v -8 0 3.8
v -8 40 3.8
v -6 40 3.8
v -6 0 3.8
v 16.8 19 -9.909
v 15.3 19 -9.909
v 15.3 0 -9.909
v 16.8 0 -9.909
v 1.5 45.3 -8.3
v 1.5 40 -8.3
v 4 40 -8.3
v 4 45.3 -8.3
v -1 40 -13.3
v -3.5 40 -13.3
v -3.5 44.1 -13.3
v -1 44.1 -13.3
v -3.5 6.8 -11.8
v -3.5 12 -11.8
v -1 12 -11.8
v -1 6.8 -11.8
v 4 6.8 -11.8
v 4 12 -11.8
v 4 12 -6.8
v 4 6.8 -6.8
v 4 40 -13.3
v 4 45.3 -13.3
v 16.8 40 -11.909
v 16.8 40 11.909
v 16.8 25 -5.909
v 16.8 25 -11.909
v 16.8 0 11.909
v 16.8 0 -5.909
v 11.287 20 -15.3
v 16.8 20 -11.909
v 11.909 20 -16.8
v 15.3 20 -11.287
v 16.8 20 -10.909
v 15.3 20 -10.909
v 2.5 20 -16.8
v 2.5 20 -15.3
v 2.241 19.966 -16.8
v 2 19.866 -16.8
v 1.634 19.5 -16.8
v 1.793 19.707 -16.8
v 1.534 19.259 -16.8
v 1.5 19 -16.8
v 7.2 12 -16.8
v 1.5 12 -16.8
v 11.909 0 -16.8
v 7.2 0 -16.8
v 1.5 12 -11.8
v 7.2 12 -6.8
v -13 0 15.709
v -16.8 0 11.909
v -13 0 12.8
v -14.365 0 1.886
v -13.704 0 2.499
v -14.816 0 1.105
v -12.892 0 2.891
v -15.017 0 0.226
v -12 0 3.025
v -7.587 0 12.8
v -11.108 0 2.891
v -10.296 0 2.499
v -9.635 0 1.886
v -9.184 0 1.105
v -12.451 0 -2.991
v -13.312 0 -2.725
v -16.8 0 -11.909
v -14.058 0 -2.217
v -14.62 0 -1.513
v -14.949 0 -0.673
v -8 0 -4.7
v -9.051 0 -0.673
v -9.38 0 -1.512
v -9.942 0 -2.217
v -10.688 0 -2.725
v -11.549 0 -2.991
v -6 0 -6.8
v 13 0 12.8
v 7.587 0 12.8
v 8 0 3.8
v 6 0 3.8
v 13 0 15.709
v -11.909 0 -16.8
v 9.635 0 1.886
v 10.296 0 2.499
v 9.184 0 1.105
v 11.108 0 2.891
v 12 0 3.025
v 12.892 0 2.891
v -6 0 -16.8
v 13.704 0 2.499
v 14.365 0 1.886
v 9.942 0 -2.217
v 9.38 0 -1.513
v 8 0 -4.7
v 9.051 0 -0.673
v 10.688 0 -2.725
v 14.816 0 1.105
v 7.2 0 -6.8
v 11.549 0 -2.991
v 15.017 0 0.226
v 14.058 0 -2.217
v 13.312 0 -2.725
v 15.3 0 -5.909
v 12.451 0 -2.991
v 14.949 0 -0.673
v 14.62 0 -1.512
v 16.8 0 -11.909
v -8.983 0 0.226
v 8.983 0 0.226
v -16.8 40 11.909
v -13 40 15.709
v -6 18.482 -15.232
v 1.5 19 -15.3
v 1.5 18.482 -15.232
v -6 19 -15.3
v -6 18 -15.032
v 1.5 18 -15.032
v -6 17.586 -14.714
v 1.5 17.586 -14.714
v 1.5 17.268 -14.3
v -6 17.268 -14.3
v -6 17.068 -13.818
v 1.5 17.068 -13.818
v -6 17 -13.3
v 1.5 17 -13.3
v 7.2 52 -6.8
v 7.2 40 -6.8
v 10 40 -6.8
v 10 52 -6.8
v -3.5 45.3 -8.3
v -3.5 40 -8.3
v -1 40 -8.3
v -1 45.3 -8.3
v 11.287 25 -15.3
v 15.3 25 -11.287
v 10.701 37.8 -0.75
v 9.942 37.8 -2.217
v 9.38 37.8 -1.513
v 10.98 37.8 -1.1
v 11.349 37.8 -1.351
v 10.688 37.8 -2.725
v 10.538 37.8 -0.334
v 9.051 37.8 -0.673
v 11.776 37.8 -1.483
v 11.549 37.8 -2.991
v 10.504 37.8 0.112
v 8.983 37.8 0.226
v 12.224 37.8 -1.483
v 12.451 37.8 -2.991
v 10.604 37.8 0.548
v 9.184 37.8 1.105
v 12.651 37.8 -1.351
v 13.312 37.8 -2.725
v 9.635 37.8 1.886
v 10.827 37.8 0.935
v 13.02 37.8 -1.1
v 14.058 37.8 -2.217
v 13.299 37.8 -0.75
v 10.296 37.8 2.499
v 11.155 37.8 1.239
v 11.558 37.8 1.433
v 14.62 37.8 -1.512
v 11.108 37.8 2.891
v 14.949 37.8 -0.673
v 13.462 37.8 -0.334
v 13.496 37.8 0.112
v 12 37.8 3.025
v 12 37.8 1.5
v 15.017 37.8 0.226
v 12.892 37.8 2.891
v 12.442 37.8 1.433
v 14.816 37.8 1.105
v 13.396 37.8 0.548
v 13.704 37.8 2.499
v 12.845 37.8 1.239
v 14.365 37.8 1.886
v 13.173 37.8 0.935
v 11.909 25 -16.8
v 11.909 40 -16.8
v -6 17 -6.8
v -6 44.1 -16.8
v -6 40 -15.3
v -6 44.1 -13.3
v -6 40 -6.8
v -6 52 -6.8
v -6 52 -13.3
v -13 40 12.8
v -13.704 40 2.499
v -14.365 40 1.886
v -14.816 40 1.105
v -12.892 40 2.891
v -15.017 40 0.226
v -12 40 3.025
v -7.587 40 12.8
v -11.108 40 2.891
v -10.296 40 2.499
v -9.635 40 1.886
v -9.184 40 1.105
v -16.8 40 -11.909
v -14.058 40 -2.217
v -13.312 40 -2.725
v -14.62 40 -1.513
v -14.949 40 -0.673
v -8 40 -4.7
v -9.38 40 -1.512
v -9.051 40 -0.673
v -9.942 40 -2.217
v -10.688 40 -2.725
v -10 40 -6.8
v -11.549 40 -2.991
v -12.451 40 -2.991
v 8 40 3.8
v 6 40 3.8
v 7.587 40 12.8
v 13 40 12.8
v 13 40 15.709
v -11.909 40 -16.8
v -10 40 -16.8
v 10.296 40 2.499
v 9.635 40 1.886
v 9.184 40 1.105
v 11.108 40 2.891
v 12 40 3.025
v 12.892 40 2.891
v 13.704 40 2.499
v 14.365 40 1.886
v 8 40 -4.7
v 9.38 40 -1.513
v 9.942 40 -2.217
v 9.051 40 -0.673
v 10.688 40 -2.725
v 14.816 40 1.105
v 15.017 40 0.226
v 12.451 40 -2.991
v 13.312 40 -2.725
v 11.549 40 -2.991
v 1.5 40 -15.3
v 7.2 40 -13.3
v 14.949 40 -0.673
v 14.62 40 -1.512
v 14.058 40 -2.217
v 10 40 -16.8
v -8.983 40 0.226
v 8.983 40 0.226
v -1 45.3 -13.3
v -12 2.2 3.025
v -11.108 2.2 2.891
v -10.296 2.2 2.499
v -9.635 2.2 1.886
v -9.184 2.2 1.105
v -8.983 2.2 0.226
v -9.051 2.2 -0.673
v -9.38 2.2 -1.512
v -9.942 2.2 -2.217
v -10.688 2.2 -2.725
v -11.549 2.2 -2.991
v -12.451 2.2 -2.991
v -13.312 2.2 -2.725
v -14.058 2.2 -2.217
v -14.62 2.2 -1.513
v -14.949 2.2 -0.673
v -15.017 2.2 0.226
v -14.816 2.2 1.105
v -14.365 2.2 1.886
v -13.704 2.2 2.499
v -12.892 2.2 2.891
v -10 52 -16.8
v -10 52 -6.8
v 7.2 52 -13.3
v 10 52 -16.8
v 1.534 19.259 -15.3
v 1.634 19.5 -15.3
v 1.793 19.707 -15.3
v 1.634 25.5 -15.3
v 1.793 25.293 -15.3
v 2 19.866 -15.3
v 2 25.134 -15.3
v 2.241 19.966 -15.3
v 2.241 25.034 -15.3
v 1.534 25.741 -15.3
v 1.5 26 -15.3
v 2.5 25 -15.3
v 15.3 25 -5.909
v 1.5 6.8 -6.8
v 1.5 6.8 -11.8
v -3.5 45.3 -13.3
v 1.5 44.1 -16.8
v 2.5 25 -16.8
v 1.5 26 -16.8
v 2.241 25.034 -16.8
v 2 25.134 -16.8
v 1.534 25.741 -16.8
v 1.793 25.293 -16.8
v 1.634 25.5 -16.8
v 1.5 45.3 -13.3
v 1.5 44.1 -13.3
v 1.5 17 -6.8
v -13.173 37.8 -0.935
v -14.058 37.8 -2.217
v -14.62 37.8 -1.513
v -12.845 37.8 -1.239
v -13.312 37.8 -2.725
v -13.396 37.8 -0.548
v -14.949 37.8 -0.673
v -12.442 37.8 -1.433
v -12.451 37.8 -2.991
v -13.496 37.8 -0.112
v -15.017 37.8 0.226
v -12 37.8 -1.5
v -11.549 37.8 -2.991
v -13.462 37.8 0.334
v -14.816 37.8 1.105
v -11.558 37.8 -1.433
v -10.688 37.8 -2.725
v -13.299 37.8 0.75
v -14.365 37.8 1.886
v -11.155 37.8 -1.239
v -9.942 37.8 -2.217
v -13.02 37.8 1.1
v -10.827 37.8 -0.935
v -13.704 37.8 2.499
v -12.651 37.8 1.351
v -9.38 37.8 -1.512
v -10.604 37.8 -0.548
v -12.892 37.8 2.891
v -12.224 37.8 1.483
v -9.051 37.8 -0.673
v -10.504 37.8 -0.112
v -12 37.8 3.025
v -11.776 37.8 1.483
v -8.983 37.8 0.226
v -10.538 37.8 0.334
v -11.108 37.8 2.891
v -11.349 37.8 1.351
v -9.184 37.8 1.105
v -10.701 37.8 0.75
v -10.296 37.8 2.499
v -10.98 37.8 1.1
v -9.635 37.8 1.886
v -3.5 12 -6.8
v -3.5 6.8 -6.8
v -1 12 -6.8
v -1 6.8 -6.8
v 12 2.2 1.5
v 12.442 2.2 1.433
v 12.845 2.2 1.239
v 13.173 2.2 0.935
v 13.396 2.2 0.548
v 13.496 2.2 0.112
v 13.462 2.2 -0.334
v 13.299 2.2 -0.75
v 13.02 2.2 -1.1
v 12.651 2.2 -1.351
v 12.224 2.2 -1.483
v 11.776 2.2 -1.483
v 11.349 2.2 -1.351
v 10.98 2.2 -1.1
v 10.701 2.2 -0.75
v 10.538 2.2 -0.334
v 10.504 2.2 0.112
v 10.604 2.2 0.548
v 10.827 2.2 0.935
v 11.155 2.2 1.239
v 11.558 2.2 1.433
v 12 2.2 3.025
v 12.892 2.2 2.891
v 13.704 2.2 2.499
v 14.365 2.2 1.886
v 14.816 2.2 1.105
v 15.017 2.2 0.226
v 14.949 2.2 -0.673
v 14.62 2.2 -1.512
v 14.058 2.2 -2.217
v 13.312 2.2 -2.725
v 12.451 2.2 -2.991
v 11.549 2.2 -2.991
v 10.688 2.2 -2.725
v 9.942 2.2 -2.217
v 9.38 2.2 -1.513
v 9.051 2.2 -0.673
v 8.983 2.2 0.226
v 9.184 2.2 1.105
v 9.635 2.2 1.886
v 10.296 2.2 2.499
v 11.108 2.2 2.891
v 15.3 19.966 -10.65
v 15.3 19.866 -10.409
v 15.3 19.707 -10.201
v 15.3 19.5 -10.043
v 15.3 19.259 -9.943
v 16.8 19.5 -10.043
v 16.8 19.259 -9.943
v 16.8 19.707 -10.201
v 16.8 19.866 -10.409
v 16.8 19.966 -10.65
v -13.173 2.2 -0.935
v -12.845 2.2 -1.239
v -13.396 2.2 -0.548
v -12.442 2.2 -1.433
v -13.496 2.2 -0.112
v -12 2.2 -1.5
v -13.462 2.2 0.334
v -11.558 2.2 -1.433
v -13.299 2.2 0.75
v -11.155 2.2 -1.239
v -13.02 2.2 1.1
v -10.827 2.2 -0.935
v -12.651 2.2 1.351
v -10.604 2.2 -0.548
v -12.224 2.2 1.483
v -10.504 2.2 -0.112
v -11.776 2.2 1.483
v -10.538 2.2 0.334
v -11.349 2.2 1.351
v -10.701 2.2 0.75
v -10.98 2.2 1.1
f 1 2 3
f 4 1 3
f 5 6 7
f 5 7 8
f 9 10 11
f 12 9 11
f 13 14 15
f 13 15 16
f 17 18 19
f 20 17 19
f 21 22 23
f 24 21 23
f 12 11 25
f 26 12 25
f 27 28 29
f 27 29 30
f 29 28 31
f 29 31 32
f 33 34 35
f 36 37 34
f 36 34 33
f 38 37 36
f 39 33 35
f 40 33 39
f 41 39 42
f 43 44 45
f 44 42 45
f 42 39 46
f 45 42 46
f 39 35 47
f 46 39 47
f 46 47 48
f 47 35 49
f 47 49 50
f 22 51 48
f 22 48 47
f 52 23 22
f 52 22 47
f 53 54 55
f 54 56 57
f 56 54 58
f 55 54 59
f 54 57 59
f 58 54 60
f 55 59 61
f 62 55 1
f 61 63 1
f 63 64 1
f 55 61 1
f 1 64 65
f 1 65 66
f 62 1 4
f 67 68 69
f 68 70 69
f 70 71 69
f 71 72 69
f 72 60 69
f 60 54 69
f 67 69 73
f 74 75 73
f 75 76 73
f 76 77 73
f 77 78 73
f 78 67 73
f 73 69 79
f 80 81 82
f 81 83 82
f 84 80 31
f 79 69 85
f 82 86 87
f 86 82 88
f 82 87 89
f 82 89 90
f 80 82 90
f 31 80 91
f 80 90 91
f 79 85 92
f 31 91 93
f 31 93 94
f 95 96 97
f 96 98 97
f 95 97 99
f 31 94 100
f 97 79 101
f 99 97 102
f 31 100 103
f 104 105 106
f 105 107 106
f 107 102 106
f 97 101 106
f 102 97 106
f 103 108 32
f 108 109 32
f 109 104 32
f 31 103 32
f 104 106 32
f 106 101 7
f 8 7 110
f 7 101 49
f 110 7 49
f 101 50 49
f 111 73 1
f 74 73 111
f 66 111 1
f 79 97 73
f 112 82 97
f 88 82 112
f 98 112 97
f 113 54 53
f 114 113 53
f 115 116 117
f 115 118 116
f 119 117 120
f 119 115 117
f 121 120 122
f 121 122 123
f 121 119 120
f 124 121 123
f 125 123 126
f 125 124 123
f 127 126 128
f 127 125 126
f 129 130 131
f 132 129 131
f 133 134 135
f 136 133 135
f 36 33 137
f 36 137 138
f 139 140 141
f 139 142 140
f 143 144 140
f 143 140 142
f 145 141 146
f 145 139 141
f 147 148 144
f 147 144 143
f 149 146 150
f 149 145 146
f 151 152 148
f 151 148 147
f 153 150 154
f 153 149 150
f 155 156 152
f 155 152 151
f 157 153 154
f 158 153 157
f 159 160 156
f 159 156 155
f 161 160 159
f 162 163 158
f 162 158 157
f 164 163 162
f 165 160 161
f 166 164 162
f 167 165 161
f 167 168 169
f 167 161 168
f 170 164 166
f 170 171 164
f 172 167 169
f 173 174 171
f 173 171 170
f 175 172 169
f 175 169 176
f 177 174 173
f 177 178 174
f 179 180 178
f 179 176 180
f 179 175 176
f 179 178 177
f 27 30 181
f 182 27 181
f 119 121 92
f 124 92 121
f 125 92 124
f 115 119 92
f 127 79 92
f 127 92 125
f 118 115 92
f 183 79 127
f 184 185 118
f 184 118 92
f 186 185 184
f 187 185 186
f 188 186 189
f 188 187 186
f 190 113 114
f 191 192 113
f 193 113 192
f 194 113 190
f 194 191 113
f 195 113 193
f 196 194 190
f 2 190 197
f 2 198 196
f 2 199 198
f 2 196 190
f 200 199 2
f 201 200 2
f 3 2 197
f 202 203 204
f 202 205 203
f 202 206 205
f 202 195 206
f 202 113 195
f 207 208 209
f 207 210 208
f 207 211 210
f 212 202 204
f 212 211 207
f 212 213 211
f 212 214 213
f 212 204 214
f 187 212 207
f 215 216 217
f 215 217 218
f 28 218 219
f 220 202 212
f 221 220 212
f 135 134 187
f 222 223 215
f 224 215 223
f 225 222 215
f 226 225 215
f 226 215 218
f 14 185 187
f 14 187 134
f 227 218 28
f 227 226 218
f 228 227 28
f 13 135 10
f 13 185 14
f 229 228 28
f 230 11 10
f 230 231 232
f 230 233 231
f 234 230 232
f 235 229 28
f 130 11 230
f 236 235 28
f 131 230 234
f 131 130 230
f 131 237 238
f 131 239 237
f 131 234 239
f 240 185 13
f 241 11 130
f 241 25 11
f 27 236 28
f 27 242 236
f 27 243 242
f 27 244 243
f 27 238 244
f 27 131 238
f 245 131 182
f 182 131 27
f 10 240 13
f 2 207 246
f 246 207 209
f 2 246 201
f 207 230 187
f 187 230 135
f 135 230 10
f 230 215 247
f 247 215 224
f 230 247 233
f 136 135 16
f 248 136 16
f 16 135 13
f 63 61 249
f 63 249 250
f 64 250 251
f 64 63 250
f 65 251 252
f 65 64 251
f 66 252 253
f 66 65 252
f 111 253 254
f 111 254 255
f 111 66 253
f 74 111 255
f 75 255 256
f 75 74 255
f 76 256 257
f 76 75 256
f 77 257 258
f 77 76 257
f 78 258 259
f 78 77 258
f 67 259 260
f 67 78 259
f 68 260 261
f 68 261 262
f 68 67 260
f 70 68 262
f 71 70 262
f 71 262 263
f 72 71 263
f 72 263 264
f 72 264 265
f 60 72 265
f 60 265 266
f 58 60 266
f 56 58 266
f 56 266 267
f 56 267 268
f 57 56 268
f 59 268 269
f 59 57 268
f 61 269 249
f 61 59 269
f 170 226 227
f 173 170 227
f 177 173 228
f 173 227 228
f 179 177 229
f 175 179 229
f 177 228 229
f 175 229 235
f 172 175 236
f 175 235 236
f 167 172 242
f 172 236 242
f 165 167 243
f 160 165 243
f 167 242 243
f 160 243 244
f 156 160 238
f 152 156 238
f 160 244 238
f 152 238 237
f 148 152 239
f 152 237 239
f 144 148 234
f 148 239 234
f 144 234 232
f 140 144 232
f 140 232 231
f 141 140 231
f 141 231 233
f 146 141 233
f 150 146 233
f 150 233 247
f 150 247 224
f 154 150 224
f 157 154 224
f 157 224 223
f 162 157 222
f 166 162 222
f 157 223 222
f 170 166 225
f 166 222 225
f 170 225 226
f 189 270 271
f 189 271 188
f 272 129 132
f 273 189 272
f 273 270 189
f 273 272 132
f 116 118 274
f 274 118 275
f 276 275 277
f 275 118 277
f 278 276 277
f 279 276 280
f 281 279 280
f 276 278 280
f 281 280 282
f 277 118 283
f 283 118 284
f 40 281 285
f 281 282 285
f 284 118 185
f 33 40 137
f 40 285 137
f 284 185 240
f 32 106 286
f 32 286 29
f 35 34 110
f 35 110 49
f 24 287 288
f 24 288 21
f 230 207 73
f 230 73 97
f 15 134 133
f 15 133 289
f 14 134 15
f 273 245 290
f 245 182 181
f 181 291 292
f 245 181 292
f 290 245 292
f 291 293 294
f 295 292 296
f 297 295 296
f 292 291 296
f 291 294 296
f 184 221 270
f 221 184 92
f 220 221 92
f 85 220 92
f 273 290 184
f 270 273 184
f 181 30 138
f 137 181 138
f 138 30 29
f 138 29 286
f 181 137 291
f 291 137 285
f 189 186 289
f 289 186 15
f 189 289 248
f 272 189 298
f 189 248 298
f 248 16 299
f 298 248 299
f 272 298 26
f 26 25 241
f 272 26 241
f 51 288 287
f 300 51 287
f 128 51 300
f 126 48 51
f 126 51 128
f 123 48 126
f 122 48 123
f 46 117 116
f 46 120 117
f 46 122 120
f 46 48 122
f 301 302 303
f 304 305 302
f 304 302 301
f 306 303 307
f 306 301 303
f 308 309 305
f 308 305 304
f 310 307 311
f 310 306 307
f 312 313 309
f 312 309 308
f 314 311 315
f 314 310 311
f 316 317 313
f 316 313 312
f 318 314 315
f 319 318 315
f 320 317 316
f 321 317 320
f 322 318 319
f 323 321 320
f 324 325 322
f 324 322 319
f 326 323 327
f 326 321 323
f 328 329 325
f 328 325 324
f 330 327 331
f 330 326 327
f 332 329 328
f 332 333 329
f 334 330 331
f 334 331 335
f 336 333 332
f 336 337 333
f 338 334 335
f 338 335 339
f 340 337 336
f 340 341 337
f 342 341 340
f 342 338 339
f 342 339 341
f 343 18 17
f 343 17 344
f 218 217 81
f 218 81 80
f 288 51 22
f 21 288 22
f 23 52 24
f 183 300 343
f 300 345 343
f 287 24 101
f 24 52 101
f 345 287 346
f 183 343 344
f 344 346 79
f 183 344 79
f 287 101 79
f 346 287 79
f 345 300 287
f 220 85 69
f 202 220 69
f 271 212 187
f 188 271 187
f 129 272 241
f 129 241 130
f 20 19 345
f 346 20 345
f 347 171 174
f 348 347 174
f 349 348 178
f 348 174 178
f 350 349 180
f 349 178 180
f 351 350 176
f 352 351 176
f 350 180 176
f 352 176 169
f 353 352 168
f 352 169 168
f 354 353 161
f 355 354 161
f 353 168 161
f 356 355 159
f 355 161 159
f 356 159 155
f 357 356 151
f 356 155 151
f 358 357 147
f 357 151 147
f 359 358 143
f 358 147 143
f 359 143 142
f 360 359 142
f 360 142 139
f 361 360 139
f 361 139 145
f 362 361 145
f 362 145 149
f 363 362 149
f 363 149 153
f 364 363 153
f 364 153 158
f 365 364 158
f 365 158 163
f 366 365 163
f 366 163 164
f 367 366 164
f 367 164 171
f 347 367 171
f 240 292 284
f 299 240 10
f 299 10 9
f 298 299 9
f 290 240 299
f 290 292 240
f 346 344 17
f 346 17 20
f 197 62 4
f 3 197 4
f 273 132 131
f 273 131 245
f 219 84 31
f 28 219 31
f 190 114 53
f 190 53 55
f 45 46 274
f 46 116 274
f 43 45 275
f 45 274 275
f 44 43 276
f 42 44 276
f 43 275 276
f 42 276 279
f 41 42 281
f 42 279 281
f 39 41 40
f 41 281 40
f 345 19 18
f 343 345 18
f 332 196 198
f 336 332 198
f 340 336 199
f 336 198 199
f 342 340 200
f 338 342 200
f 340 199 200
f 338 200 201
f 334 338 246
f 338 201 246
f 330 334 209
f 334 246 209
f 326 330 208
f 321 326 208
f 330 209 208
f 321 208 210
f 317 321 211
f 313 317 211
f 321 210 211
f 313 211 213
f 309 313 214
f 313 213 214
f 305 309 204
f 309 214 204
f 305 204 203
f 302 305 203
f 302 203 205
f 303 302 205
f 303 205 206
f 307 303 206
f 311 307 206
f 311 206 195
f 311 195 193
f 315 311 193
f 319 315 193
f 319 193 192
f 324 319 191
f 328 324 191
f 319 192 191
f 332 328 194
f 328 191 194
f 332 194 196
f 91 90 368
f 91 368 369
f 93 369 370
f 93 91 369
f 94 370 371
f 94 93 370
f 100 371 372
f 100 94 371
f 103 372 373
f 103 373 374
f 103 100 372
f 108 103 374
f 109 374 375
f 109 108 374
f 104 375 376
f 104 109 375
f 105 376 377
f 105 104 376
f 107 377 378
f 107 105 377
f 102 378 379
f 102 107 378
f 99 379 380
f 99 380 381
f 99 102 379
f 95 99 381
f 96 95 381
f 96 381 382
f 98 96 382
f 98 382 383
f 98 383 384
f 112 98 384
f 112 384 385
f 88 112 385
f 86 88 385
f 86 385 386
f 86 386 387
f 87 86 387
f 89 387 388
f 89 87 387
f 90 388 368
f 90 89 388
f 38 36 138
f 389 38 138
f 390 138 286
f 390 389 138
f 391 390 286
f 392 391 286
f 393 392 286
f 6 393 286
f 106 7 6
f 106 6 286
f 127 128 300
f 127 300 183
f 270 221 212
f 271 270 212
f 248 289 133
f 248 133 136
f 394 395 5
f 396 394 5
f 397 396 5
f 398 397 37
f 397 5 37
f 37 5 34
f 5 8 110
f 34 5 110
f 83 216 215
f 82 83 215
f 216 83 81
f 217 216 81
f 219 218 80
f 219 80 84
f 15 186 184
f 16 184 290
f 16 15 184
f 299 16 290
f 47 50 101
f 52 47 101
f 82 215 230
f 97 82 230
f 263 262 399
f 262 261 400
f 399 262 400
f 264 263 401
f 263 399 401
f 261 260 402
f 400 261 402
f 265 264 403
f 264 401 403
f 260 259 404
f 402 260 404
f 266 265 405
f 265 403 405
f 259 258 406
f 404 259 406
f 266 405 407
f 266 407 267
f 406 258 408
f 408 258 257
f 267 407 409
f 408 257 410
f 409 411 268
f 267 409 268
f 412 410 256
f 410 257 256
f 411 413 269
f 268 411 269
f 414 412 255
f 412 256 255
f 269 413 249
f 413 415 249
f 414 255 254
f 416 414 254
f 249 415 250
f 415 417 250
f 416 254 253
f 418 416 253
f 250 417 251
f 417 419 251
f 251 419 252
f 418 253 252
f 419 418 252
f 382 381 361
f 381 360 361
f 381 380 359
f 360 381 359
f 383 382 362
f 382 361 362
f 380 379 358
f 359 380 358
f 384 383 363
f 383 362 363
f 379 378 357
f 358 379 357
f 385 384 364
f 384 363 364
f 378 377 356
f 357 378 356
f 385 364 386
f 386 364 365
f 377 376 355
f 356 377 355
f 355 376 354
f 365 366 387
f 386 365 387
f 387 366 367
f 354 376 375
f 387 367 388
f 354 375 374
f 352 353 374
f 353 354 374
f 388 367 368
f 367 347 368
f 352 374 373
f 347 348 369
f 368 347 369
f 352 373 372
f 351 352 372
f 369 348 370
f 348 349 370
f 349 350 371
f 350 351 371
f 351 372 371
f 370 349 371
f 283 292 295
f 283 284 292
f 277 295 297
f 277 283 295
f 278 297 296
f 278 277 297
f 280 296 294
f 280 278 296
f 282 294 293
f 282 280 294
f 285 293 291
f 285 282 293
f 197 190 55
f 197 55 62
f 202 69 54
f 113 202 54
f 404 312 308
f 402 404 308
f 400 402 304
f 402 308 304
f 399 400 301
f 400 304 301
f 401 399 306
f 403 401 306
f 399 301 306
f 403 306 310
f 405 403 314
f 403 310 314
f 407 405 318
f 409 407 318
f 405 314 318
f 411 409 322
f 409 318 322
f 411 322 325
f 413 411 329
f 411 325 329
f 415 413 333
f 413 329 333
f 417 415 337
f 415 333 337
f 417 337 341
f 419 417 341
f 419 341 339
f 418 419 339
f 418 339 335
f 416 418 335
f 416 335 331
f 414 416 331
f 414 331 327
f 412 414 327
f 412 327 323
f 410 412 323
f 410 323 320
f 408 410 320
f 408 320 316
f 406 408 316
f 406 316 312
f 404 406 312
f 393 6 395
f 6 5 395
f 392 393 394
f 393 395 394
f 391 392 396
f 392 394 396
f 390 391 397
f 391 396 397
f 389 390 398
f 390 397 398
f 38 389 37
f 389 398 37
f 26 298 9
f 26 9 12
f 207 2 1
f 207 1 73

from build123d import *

# Parameters (mm, degrees)
EXTRUDE_1_DEPTH      = 40
SKETCH_2_R           = 1.5
CUT_EXTRUDE_1_DEPTH  = 47.523972315
CUT_EXTRUDE_2_DEPTH  = 47.523972315
EXTRUDE_2_DEPTH      = 12
SKETCH_5_W           = 12
SKETCH_5_H           = 8.5
CUT_EXTRUDE_3_DEPTH  = 47.523972315
CUT_EXTRUDE_4_DEPTH  = 12
SKETCH_7_W           = 2.5
SKETCH_7_H           = 5
EXTRUDE_3_DEPTH      = 5.3
SKETCH_8_W           = 2.5
SKETCH_8_H           = 5
EXTRUDE_4_DEPTH      = 5.2
SKETCH_10_W          = 16
SKETCH_10_H          = 8.5
CUT_EXTRUDE_5_DEPTH  = 47.523972315
SKETCH_11_W          = 7.5
SKETCH_11_H          = 4.1
CUT_EXTRUDE_6_DEPTH  = 11
SKETCH_15_W          = 7.5
SKETCH_15_H          = 5
CUT_EXTRUDE_10_DEPTH = 10
SKETCH_12_W          = 7.5
SKETCH_12_H          = 1.5
CUT_EXTRUDE_7_DEPTH  = 28
CUT_EXTRUDE_START    = -20
CUT_EXTRUDE_8_DEPTH  = 5
FILLET_2_R           = 2
SKETCH_16_R          = 3.025
CUT_EXTRUDE_11_DEPTH = 2.2
SKETCH_17_W          = 1.5
SKETCH_17_H          = 4
CUT_EXTRUDE_12_DEPTH = 40.855739863
FILLET_3_R           = 1


with BuildPart() as part:
    # 草图1 → 凸台-拉伸1 (new body)
    with BuildSketch(Plane(origin=(0, 0, 0), x_dir=(1, 0, 0), z_dir=(0, 1, 0))):
        Polygon((11.908535316, 16.8), (-11.908535316, 16.8), (-16.8, 11.908535316), (-16.8, -11.908535316), (-11.908535316, -16.8), (11.908535316, -16.8), (16.8, -11.908535316), (16.8, 11.908535316), align=None)
    extrude(amount=EXTRUDE_1_DEPTH)

    # 草图2 → 切除-拉伸1 (cut, through all)
    with BuildSketch(Plane(origin=(0, 40, 0), x_dir=(1, 0, 0), z_dir=(0, 1, 0))):
        with Locations(Location((12, 0, 0), (0, 0, 270))):
            Circle(SKETCH_2_R)
        with Locations(Location((-12, 0, 0), (0, 0, 90))):
            Circle(SKETCH_2_R)
    extrude(amount=-CUT_EXTRUDE_1_DEPTH, mode=Mode.SUBTRACT)

    # 草图3 → 切除-拉伸2 (cut, through all)
    with BuildSketch(Plane(origin=(0, 40, 0), x_dir=(1, 0, 0), z_dir=(0, 1, 0))):
        Polygon((-6, -3.8), (6, -3.8), (7.586942826, -12.8), (13, -12.8), (13, -16.8), (-13, -16.8), (-13, -12.8), (-7.586942826, -12.8), align=None)
    extrude(amount=-CUT_EXTRUDE_2_DEPTH, mode=Mode.SUBTRACT)

    # 草图4 → 凸台-拉伸2 (add)
    with BuildSketch(Plane(origin=(0, 40, 0), x_dir=(1, 0, 0), z_dir=(0, 1, 0))):
        Polygon((-10, 16.8), (-10, 6.8), (-6, 6.8), (-6, 13.3), (7.2, 13.3), (7.2, 6.8), (10, 6.8), (10, 16.8), align=None)
    extrude(amount=EXTRUDE_2_DEPTH)

    # 草图5 → 切除-拉伸3 (cut, through all)
    with BuildSketch(Plane(origin=(0, 40, 0), x_dir=(1, 0, 0), z_dir=(0, 1, 0))):
        with Locations((0, 0.45)):
            Rectangle(SKETCH_5_W, SKETCH_5_H)
    extrude(amount=-CUT_EXTRUDE_3_DEPTH, mode=Mode.SUBTRACT)

    # 草图6 → 切除-拉伸4 (cut)
    with BuildSketch(Plane.XZ):
        Polygon((-6, -6.8), (-6, -13.3), (-6, -16.8), (7.2, -16.8), (7.2, -13.3), (7.2, -6.8), align=None)
    extrude(amount=-CUT_EXTRUDE_4_DEPTH, mode=Mode.SUBTRACT)

    # 草图7 → 凸台-拉伸3 (add)
    with BuildSketch(Plane(origin=(0, 40, 0), x_dir=(1, 0, 0), z_dir=(0, 1, 0))):
        with Locations((2.75, 10.8)):
            Rectangle(SKETCH_7_W, SKETCH_7_H)
        with Locations((-2.25, 10.8)):
            Rectangle(SKETCH_7_W, SKETCH_7_H)
    extrude(amount=EXTRUDE_3_DEPTH)

    # 草图8 → 凸台-拉伸4 (add)
    with BuildSketch(Plane.XZ.offset(-12)):
        with Locations((-2.25, -9.3)):
            Rectangle(SKETCH_8_W, SKETCH_8_H)
        with Locations((2.75, -9.3)):
            Rectangle(SKETCH_8_W, SKETCH_8_H)
    extrude(amount=EXTRUDE_4_DEPTH)

    # 草图10 → 切除-拉伸5 (cut, through all)
    with BuildSketch(Plane(origin=(0, 40, 0), x_dir=(1, 0, 0), z_dir=(0, 1, 0))):
        with Locations((0, 0.45)):
            Rectangle(SKETCH_10_W, SKETCH_10_H)
    extrude(amount=-CUT_EXTRUDE_5_DEPTH, mode=Mode.SUBTRACT)

    # 草图11 → 切除-拉伸6 (cut)
    with BuildSketch(Plane.XY.offset(-13.3)):
        with Locations((-2.25, 42.05)):
            Rectangle(SKETCH_11_W, SKETCH_11_H)
    extrude(amount=-CUT_EXTRUDE_6_DEPTH, mode=Mode.SUBTRACT)

    # 草图15 → 切除-拉伸10 (cut)
    with BuildSketch(Plane(origin=(0, 0, -16.8), x_dir=(-1, 0, 0), z_dir=(0, 0, -1))):
        with Locations((2.25, 14.5)):
            Rectangle(SKETCH_15_W, SKETCH_15_H)
    extrude(amount=-CUT_EXTRUDE_10_DEPTH, mode=Mode.SUBTRACT)

    # 草图12 → 切除-拉伸7 (cut)
    with BuildSketch(Plane(origin=(0, 40, 0), x_dir=(1, 0, 0), z_dir=(0, 1, 0))):
        with Locations((-2.25, 16.05)):
            Rectangle(SKETCH_12_W, SKETCH_12_H)
    extrude(amount=-CUT_EXTRUDE_7_DEPTH, mode=Mode.SUBTRACT)

    # 草图13 → 切除-拉伸8 (cut)
    with BuildSketch(Plane.XZ.offset(CUT_EXTRUDE_START)):
        Polygon((11.908535316, -16.8), (1.5, -16.8), (1.5, -15.3), (11.287214973, -15.3), (15.3, -11.287214973), (15.3, -5.908535316), (16.8, -5.908535316), (16.8, -11.908535316), align=None)
    extrude(amount=-CUT_EXTRUDE_8_DEPTH, mode=Mode.SUBTRACT)

    # 圆角2
    fillet_2_edges = [part.edges().sort_by_distance(p)[0] for p in [
        (-2.25, 17, -15.3),
    ]]
    fillet(fillet_2_edges, radius=FILLET_2_R)

    # 草图16 → 切除-拉伸11 (cut)
    with BuildSketch(Plane(origin=(0, 40, 0), x_dir=(1, 0, 0), z_dir=(0, 1, 0))):
        with Locations(Location((12, 0, 0), (0, 0, 270))):
            Circle(SKETCH_16_R)
        with Locations(Location((-12, 0, 0), (0, 0, 270))):
            Circle(SKETCH_16_R)
    cut_extrude_11 = extrude(amount=-CUT_EXTRUDE_11_DEPTH, mode=Mode.SUBTRACT)

    # 镜向1: 切除-拉伸11 across plane
    add(cut_extrude_11.mirror(Plane.ZX.offset(20)), mode=Mode.SUBTRACT)

    # 草图17 → 切除-拉伸12 (cut, through all)
    with BuildSketch(Plane(origin=(0, 20, 0), x_dir=(1, 0, 0), z_dir=(0, 1, 0))):
        with Locations((16.05, 7.908535316)):
            Rectangle(SKETCH_17_W, SKETCH_17_H)
    extrude(amount=-CUT_EXTRUDE_12_DEPTH, mode=Mode.SUBTRACT)

    # 圆角3
    fillet_3_edges = [part.edges().sort_by_distance(p)[0] for p in [
        (1.5, 25, -16.05),
        (1.5, 20, -16.05),
        (16.05, 20, -9.908535316),
    ]]
    fillet(fillet_3_edges, radius=FILLET_3_R)


solid = part.part
